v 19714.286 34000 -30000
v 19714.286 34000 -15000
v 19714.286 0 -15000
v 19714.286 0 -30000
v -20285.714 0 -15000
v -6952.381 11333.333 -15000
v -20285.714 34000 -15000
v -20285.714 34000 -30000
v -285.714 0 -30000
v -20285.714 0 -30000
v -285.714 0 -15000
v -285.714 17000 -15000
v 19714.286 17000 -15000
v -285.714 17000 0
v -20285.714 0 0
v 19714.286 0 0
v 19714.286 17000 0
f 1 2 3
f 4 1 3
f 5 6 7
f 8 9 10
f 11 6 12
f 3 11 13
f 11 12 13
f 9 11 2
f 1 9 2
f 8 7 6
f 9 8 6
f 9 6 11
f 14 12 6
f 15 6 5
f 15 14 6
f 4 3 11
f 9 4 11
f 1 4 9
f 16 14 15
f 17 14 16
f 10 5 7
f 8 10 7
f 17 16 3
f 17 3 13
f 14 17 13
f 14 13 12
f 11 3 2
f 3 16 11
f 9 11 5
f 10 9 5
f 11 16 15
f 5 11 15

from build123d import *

# Parameters (mm, degrees)
BOSS_EXTRUDE1_DEPTH  = 15000
BOSS_EXTRUDE2_DEPTH  = 15000
BOSS_EXTRUDE16_DEPTH = 15000


with BuildPart() as part:
    # Sketch1 → Boss-Extrude1 (new body)
    with BuildSketch(Plane.XY):
        Polygon((-20285.714285714, 0), (19714.285714286, 0), (19714.285714286, 17000), (-285.714285714, 17000), align=None)
    extrude(amount=-BOSS_EXTRUDE1_DEPTH)

    # Sketch2 → Boss-Extrude2 (add)
    with BuildSketch(Plane(origin=(0, 0, -15000), x_dir=(-1, 0, 0), z_dir=(0, 0, -1))):
        Polygon((285.714285714, 0), (20285.714285714, 0), (20285.714285714, 34000), align=None)
    extrude(amount=BOSS_EXTRUDE2_DEPTH)


with BuildPart() as body_2:
    # Sketch5 → Boss-Extrude16 (new body)
    with BuildSketch(Plane(origin=(0, 0, -15000), x_dir=(-1, 0, 0), z_dir=(0, 0, -1))):
        Polygon((-19714.285714286, 17000), (-9714.285714286, 17000), (-19714.285714286, 34000), align=None)
        Polygon((-19714.285714286, 0), (285.714285714, 0), (-9714.285714286, 17000), (-19714.285714286, 17000), align=None)
    extrude(amount=BOSS_EXTRUDE16_DEPTH)


solid = Compound([part.part, body_2.part])
